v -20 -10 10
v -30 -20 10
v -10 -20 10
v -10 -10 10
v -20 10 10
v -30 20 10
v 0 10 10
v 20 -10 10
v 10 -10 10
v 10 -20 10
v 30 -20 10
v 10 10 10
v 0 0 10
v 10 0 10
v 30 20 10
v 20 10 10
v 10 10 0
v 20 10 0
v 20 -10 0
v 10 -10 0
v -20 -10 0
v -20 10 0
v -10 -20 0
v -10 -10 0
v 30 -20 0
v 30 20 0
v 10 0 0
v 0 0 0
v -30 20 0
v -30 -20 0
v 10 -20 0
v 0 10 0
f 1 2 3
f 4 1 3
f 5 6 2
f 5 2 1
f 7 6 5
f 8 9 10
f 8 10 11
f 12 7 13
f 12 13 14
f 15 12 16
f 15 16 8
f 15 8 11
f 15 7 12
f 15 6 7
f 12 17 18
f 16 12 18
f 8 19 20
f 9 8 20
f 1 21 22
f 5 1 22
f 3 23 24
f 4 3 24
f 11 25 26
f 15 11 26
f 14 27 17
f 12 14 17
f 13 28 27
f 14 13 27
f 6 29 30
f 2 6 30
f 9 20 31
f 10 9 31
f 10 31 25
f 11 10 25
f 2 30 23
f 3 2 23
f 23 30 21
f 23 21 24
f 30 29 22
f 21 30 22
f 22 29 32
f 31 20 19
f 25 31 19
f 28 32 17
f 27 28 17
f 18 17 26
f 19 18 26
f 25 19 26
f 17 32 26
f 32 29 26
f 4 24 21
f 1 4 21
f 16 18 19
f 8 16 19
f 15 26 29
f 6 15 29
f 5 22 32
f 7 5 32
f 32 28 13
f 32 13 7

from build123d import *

# Parameters (mm, degrees)
F0_W     = 10
F0_H     = 10
F1_DEPTH = 10


with BuildPart() as f1:
    # F0 (on Top) → F1 (new body)
    with BuildSketch(Plane.XY):
        Polygon((30, 20), (-30, 20), (-30, -20), (-10, -20), (-10, -10), (-20, -10), (-20, 10), (0, 10), (10, 10), (20, 10), (20, -10), (10, -10), (10, -20), (30, -20), align=None)
        with Locations((5, 5)):
            Rectangle(F0_W, F0_H)
    extrude(amount=F1_DEPTH)


solid = f1.part
